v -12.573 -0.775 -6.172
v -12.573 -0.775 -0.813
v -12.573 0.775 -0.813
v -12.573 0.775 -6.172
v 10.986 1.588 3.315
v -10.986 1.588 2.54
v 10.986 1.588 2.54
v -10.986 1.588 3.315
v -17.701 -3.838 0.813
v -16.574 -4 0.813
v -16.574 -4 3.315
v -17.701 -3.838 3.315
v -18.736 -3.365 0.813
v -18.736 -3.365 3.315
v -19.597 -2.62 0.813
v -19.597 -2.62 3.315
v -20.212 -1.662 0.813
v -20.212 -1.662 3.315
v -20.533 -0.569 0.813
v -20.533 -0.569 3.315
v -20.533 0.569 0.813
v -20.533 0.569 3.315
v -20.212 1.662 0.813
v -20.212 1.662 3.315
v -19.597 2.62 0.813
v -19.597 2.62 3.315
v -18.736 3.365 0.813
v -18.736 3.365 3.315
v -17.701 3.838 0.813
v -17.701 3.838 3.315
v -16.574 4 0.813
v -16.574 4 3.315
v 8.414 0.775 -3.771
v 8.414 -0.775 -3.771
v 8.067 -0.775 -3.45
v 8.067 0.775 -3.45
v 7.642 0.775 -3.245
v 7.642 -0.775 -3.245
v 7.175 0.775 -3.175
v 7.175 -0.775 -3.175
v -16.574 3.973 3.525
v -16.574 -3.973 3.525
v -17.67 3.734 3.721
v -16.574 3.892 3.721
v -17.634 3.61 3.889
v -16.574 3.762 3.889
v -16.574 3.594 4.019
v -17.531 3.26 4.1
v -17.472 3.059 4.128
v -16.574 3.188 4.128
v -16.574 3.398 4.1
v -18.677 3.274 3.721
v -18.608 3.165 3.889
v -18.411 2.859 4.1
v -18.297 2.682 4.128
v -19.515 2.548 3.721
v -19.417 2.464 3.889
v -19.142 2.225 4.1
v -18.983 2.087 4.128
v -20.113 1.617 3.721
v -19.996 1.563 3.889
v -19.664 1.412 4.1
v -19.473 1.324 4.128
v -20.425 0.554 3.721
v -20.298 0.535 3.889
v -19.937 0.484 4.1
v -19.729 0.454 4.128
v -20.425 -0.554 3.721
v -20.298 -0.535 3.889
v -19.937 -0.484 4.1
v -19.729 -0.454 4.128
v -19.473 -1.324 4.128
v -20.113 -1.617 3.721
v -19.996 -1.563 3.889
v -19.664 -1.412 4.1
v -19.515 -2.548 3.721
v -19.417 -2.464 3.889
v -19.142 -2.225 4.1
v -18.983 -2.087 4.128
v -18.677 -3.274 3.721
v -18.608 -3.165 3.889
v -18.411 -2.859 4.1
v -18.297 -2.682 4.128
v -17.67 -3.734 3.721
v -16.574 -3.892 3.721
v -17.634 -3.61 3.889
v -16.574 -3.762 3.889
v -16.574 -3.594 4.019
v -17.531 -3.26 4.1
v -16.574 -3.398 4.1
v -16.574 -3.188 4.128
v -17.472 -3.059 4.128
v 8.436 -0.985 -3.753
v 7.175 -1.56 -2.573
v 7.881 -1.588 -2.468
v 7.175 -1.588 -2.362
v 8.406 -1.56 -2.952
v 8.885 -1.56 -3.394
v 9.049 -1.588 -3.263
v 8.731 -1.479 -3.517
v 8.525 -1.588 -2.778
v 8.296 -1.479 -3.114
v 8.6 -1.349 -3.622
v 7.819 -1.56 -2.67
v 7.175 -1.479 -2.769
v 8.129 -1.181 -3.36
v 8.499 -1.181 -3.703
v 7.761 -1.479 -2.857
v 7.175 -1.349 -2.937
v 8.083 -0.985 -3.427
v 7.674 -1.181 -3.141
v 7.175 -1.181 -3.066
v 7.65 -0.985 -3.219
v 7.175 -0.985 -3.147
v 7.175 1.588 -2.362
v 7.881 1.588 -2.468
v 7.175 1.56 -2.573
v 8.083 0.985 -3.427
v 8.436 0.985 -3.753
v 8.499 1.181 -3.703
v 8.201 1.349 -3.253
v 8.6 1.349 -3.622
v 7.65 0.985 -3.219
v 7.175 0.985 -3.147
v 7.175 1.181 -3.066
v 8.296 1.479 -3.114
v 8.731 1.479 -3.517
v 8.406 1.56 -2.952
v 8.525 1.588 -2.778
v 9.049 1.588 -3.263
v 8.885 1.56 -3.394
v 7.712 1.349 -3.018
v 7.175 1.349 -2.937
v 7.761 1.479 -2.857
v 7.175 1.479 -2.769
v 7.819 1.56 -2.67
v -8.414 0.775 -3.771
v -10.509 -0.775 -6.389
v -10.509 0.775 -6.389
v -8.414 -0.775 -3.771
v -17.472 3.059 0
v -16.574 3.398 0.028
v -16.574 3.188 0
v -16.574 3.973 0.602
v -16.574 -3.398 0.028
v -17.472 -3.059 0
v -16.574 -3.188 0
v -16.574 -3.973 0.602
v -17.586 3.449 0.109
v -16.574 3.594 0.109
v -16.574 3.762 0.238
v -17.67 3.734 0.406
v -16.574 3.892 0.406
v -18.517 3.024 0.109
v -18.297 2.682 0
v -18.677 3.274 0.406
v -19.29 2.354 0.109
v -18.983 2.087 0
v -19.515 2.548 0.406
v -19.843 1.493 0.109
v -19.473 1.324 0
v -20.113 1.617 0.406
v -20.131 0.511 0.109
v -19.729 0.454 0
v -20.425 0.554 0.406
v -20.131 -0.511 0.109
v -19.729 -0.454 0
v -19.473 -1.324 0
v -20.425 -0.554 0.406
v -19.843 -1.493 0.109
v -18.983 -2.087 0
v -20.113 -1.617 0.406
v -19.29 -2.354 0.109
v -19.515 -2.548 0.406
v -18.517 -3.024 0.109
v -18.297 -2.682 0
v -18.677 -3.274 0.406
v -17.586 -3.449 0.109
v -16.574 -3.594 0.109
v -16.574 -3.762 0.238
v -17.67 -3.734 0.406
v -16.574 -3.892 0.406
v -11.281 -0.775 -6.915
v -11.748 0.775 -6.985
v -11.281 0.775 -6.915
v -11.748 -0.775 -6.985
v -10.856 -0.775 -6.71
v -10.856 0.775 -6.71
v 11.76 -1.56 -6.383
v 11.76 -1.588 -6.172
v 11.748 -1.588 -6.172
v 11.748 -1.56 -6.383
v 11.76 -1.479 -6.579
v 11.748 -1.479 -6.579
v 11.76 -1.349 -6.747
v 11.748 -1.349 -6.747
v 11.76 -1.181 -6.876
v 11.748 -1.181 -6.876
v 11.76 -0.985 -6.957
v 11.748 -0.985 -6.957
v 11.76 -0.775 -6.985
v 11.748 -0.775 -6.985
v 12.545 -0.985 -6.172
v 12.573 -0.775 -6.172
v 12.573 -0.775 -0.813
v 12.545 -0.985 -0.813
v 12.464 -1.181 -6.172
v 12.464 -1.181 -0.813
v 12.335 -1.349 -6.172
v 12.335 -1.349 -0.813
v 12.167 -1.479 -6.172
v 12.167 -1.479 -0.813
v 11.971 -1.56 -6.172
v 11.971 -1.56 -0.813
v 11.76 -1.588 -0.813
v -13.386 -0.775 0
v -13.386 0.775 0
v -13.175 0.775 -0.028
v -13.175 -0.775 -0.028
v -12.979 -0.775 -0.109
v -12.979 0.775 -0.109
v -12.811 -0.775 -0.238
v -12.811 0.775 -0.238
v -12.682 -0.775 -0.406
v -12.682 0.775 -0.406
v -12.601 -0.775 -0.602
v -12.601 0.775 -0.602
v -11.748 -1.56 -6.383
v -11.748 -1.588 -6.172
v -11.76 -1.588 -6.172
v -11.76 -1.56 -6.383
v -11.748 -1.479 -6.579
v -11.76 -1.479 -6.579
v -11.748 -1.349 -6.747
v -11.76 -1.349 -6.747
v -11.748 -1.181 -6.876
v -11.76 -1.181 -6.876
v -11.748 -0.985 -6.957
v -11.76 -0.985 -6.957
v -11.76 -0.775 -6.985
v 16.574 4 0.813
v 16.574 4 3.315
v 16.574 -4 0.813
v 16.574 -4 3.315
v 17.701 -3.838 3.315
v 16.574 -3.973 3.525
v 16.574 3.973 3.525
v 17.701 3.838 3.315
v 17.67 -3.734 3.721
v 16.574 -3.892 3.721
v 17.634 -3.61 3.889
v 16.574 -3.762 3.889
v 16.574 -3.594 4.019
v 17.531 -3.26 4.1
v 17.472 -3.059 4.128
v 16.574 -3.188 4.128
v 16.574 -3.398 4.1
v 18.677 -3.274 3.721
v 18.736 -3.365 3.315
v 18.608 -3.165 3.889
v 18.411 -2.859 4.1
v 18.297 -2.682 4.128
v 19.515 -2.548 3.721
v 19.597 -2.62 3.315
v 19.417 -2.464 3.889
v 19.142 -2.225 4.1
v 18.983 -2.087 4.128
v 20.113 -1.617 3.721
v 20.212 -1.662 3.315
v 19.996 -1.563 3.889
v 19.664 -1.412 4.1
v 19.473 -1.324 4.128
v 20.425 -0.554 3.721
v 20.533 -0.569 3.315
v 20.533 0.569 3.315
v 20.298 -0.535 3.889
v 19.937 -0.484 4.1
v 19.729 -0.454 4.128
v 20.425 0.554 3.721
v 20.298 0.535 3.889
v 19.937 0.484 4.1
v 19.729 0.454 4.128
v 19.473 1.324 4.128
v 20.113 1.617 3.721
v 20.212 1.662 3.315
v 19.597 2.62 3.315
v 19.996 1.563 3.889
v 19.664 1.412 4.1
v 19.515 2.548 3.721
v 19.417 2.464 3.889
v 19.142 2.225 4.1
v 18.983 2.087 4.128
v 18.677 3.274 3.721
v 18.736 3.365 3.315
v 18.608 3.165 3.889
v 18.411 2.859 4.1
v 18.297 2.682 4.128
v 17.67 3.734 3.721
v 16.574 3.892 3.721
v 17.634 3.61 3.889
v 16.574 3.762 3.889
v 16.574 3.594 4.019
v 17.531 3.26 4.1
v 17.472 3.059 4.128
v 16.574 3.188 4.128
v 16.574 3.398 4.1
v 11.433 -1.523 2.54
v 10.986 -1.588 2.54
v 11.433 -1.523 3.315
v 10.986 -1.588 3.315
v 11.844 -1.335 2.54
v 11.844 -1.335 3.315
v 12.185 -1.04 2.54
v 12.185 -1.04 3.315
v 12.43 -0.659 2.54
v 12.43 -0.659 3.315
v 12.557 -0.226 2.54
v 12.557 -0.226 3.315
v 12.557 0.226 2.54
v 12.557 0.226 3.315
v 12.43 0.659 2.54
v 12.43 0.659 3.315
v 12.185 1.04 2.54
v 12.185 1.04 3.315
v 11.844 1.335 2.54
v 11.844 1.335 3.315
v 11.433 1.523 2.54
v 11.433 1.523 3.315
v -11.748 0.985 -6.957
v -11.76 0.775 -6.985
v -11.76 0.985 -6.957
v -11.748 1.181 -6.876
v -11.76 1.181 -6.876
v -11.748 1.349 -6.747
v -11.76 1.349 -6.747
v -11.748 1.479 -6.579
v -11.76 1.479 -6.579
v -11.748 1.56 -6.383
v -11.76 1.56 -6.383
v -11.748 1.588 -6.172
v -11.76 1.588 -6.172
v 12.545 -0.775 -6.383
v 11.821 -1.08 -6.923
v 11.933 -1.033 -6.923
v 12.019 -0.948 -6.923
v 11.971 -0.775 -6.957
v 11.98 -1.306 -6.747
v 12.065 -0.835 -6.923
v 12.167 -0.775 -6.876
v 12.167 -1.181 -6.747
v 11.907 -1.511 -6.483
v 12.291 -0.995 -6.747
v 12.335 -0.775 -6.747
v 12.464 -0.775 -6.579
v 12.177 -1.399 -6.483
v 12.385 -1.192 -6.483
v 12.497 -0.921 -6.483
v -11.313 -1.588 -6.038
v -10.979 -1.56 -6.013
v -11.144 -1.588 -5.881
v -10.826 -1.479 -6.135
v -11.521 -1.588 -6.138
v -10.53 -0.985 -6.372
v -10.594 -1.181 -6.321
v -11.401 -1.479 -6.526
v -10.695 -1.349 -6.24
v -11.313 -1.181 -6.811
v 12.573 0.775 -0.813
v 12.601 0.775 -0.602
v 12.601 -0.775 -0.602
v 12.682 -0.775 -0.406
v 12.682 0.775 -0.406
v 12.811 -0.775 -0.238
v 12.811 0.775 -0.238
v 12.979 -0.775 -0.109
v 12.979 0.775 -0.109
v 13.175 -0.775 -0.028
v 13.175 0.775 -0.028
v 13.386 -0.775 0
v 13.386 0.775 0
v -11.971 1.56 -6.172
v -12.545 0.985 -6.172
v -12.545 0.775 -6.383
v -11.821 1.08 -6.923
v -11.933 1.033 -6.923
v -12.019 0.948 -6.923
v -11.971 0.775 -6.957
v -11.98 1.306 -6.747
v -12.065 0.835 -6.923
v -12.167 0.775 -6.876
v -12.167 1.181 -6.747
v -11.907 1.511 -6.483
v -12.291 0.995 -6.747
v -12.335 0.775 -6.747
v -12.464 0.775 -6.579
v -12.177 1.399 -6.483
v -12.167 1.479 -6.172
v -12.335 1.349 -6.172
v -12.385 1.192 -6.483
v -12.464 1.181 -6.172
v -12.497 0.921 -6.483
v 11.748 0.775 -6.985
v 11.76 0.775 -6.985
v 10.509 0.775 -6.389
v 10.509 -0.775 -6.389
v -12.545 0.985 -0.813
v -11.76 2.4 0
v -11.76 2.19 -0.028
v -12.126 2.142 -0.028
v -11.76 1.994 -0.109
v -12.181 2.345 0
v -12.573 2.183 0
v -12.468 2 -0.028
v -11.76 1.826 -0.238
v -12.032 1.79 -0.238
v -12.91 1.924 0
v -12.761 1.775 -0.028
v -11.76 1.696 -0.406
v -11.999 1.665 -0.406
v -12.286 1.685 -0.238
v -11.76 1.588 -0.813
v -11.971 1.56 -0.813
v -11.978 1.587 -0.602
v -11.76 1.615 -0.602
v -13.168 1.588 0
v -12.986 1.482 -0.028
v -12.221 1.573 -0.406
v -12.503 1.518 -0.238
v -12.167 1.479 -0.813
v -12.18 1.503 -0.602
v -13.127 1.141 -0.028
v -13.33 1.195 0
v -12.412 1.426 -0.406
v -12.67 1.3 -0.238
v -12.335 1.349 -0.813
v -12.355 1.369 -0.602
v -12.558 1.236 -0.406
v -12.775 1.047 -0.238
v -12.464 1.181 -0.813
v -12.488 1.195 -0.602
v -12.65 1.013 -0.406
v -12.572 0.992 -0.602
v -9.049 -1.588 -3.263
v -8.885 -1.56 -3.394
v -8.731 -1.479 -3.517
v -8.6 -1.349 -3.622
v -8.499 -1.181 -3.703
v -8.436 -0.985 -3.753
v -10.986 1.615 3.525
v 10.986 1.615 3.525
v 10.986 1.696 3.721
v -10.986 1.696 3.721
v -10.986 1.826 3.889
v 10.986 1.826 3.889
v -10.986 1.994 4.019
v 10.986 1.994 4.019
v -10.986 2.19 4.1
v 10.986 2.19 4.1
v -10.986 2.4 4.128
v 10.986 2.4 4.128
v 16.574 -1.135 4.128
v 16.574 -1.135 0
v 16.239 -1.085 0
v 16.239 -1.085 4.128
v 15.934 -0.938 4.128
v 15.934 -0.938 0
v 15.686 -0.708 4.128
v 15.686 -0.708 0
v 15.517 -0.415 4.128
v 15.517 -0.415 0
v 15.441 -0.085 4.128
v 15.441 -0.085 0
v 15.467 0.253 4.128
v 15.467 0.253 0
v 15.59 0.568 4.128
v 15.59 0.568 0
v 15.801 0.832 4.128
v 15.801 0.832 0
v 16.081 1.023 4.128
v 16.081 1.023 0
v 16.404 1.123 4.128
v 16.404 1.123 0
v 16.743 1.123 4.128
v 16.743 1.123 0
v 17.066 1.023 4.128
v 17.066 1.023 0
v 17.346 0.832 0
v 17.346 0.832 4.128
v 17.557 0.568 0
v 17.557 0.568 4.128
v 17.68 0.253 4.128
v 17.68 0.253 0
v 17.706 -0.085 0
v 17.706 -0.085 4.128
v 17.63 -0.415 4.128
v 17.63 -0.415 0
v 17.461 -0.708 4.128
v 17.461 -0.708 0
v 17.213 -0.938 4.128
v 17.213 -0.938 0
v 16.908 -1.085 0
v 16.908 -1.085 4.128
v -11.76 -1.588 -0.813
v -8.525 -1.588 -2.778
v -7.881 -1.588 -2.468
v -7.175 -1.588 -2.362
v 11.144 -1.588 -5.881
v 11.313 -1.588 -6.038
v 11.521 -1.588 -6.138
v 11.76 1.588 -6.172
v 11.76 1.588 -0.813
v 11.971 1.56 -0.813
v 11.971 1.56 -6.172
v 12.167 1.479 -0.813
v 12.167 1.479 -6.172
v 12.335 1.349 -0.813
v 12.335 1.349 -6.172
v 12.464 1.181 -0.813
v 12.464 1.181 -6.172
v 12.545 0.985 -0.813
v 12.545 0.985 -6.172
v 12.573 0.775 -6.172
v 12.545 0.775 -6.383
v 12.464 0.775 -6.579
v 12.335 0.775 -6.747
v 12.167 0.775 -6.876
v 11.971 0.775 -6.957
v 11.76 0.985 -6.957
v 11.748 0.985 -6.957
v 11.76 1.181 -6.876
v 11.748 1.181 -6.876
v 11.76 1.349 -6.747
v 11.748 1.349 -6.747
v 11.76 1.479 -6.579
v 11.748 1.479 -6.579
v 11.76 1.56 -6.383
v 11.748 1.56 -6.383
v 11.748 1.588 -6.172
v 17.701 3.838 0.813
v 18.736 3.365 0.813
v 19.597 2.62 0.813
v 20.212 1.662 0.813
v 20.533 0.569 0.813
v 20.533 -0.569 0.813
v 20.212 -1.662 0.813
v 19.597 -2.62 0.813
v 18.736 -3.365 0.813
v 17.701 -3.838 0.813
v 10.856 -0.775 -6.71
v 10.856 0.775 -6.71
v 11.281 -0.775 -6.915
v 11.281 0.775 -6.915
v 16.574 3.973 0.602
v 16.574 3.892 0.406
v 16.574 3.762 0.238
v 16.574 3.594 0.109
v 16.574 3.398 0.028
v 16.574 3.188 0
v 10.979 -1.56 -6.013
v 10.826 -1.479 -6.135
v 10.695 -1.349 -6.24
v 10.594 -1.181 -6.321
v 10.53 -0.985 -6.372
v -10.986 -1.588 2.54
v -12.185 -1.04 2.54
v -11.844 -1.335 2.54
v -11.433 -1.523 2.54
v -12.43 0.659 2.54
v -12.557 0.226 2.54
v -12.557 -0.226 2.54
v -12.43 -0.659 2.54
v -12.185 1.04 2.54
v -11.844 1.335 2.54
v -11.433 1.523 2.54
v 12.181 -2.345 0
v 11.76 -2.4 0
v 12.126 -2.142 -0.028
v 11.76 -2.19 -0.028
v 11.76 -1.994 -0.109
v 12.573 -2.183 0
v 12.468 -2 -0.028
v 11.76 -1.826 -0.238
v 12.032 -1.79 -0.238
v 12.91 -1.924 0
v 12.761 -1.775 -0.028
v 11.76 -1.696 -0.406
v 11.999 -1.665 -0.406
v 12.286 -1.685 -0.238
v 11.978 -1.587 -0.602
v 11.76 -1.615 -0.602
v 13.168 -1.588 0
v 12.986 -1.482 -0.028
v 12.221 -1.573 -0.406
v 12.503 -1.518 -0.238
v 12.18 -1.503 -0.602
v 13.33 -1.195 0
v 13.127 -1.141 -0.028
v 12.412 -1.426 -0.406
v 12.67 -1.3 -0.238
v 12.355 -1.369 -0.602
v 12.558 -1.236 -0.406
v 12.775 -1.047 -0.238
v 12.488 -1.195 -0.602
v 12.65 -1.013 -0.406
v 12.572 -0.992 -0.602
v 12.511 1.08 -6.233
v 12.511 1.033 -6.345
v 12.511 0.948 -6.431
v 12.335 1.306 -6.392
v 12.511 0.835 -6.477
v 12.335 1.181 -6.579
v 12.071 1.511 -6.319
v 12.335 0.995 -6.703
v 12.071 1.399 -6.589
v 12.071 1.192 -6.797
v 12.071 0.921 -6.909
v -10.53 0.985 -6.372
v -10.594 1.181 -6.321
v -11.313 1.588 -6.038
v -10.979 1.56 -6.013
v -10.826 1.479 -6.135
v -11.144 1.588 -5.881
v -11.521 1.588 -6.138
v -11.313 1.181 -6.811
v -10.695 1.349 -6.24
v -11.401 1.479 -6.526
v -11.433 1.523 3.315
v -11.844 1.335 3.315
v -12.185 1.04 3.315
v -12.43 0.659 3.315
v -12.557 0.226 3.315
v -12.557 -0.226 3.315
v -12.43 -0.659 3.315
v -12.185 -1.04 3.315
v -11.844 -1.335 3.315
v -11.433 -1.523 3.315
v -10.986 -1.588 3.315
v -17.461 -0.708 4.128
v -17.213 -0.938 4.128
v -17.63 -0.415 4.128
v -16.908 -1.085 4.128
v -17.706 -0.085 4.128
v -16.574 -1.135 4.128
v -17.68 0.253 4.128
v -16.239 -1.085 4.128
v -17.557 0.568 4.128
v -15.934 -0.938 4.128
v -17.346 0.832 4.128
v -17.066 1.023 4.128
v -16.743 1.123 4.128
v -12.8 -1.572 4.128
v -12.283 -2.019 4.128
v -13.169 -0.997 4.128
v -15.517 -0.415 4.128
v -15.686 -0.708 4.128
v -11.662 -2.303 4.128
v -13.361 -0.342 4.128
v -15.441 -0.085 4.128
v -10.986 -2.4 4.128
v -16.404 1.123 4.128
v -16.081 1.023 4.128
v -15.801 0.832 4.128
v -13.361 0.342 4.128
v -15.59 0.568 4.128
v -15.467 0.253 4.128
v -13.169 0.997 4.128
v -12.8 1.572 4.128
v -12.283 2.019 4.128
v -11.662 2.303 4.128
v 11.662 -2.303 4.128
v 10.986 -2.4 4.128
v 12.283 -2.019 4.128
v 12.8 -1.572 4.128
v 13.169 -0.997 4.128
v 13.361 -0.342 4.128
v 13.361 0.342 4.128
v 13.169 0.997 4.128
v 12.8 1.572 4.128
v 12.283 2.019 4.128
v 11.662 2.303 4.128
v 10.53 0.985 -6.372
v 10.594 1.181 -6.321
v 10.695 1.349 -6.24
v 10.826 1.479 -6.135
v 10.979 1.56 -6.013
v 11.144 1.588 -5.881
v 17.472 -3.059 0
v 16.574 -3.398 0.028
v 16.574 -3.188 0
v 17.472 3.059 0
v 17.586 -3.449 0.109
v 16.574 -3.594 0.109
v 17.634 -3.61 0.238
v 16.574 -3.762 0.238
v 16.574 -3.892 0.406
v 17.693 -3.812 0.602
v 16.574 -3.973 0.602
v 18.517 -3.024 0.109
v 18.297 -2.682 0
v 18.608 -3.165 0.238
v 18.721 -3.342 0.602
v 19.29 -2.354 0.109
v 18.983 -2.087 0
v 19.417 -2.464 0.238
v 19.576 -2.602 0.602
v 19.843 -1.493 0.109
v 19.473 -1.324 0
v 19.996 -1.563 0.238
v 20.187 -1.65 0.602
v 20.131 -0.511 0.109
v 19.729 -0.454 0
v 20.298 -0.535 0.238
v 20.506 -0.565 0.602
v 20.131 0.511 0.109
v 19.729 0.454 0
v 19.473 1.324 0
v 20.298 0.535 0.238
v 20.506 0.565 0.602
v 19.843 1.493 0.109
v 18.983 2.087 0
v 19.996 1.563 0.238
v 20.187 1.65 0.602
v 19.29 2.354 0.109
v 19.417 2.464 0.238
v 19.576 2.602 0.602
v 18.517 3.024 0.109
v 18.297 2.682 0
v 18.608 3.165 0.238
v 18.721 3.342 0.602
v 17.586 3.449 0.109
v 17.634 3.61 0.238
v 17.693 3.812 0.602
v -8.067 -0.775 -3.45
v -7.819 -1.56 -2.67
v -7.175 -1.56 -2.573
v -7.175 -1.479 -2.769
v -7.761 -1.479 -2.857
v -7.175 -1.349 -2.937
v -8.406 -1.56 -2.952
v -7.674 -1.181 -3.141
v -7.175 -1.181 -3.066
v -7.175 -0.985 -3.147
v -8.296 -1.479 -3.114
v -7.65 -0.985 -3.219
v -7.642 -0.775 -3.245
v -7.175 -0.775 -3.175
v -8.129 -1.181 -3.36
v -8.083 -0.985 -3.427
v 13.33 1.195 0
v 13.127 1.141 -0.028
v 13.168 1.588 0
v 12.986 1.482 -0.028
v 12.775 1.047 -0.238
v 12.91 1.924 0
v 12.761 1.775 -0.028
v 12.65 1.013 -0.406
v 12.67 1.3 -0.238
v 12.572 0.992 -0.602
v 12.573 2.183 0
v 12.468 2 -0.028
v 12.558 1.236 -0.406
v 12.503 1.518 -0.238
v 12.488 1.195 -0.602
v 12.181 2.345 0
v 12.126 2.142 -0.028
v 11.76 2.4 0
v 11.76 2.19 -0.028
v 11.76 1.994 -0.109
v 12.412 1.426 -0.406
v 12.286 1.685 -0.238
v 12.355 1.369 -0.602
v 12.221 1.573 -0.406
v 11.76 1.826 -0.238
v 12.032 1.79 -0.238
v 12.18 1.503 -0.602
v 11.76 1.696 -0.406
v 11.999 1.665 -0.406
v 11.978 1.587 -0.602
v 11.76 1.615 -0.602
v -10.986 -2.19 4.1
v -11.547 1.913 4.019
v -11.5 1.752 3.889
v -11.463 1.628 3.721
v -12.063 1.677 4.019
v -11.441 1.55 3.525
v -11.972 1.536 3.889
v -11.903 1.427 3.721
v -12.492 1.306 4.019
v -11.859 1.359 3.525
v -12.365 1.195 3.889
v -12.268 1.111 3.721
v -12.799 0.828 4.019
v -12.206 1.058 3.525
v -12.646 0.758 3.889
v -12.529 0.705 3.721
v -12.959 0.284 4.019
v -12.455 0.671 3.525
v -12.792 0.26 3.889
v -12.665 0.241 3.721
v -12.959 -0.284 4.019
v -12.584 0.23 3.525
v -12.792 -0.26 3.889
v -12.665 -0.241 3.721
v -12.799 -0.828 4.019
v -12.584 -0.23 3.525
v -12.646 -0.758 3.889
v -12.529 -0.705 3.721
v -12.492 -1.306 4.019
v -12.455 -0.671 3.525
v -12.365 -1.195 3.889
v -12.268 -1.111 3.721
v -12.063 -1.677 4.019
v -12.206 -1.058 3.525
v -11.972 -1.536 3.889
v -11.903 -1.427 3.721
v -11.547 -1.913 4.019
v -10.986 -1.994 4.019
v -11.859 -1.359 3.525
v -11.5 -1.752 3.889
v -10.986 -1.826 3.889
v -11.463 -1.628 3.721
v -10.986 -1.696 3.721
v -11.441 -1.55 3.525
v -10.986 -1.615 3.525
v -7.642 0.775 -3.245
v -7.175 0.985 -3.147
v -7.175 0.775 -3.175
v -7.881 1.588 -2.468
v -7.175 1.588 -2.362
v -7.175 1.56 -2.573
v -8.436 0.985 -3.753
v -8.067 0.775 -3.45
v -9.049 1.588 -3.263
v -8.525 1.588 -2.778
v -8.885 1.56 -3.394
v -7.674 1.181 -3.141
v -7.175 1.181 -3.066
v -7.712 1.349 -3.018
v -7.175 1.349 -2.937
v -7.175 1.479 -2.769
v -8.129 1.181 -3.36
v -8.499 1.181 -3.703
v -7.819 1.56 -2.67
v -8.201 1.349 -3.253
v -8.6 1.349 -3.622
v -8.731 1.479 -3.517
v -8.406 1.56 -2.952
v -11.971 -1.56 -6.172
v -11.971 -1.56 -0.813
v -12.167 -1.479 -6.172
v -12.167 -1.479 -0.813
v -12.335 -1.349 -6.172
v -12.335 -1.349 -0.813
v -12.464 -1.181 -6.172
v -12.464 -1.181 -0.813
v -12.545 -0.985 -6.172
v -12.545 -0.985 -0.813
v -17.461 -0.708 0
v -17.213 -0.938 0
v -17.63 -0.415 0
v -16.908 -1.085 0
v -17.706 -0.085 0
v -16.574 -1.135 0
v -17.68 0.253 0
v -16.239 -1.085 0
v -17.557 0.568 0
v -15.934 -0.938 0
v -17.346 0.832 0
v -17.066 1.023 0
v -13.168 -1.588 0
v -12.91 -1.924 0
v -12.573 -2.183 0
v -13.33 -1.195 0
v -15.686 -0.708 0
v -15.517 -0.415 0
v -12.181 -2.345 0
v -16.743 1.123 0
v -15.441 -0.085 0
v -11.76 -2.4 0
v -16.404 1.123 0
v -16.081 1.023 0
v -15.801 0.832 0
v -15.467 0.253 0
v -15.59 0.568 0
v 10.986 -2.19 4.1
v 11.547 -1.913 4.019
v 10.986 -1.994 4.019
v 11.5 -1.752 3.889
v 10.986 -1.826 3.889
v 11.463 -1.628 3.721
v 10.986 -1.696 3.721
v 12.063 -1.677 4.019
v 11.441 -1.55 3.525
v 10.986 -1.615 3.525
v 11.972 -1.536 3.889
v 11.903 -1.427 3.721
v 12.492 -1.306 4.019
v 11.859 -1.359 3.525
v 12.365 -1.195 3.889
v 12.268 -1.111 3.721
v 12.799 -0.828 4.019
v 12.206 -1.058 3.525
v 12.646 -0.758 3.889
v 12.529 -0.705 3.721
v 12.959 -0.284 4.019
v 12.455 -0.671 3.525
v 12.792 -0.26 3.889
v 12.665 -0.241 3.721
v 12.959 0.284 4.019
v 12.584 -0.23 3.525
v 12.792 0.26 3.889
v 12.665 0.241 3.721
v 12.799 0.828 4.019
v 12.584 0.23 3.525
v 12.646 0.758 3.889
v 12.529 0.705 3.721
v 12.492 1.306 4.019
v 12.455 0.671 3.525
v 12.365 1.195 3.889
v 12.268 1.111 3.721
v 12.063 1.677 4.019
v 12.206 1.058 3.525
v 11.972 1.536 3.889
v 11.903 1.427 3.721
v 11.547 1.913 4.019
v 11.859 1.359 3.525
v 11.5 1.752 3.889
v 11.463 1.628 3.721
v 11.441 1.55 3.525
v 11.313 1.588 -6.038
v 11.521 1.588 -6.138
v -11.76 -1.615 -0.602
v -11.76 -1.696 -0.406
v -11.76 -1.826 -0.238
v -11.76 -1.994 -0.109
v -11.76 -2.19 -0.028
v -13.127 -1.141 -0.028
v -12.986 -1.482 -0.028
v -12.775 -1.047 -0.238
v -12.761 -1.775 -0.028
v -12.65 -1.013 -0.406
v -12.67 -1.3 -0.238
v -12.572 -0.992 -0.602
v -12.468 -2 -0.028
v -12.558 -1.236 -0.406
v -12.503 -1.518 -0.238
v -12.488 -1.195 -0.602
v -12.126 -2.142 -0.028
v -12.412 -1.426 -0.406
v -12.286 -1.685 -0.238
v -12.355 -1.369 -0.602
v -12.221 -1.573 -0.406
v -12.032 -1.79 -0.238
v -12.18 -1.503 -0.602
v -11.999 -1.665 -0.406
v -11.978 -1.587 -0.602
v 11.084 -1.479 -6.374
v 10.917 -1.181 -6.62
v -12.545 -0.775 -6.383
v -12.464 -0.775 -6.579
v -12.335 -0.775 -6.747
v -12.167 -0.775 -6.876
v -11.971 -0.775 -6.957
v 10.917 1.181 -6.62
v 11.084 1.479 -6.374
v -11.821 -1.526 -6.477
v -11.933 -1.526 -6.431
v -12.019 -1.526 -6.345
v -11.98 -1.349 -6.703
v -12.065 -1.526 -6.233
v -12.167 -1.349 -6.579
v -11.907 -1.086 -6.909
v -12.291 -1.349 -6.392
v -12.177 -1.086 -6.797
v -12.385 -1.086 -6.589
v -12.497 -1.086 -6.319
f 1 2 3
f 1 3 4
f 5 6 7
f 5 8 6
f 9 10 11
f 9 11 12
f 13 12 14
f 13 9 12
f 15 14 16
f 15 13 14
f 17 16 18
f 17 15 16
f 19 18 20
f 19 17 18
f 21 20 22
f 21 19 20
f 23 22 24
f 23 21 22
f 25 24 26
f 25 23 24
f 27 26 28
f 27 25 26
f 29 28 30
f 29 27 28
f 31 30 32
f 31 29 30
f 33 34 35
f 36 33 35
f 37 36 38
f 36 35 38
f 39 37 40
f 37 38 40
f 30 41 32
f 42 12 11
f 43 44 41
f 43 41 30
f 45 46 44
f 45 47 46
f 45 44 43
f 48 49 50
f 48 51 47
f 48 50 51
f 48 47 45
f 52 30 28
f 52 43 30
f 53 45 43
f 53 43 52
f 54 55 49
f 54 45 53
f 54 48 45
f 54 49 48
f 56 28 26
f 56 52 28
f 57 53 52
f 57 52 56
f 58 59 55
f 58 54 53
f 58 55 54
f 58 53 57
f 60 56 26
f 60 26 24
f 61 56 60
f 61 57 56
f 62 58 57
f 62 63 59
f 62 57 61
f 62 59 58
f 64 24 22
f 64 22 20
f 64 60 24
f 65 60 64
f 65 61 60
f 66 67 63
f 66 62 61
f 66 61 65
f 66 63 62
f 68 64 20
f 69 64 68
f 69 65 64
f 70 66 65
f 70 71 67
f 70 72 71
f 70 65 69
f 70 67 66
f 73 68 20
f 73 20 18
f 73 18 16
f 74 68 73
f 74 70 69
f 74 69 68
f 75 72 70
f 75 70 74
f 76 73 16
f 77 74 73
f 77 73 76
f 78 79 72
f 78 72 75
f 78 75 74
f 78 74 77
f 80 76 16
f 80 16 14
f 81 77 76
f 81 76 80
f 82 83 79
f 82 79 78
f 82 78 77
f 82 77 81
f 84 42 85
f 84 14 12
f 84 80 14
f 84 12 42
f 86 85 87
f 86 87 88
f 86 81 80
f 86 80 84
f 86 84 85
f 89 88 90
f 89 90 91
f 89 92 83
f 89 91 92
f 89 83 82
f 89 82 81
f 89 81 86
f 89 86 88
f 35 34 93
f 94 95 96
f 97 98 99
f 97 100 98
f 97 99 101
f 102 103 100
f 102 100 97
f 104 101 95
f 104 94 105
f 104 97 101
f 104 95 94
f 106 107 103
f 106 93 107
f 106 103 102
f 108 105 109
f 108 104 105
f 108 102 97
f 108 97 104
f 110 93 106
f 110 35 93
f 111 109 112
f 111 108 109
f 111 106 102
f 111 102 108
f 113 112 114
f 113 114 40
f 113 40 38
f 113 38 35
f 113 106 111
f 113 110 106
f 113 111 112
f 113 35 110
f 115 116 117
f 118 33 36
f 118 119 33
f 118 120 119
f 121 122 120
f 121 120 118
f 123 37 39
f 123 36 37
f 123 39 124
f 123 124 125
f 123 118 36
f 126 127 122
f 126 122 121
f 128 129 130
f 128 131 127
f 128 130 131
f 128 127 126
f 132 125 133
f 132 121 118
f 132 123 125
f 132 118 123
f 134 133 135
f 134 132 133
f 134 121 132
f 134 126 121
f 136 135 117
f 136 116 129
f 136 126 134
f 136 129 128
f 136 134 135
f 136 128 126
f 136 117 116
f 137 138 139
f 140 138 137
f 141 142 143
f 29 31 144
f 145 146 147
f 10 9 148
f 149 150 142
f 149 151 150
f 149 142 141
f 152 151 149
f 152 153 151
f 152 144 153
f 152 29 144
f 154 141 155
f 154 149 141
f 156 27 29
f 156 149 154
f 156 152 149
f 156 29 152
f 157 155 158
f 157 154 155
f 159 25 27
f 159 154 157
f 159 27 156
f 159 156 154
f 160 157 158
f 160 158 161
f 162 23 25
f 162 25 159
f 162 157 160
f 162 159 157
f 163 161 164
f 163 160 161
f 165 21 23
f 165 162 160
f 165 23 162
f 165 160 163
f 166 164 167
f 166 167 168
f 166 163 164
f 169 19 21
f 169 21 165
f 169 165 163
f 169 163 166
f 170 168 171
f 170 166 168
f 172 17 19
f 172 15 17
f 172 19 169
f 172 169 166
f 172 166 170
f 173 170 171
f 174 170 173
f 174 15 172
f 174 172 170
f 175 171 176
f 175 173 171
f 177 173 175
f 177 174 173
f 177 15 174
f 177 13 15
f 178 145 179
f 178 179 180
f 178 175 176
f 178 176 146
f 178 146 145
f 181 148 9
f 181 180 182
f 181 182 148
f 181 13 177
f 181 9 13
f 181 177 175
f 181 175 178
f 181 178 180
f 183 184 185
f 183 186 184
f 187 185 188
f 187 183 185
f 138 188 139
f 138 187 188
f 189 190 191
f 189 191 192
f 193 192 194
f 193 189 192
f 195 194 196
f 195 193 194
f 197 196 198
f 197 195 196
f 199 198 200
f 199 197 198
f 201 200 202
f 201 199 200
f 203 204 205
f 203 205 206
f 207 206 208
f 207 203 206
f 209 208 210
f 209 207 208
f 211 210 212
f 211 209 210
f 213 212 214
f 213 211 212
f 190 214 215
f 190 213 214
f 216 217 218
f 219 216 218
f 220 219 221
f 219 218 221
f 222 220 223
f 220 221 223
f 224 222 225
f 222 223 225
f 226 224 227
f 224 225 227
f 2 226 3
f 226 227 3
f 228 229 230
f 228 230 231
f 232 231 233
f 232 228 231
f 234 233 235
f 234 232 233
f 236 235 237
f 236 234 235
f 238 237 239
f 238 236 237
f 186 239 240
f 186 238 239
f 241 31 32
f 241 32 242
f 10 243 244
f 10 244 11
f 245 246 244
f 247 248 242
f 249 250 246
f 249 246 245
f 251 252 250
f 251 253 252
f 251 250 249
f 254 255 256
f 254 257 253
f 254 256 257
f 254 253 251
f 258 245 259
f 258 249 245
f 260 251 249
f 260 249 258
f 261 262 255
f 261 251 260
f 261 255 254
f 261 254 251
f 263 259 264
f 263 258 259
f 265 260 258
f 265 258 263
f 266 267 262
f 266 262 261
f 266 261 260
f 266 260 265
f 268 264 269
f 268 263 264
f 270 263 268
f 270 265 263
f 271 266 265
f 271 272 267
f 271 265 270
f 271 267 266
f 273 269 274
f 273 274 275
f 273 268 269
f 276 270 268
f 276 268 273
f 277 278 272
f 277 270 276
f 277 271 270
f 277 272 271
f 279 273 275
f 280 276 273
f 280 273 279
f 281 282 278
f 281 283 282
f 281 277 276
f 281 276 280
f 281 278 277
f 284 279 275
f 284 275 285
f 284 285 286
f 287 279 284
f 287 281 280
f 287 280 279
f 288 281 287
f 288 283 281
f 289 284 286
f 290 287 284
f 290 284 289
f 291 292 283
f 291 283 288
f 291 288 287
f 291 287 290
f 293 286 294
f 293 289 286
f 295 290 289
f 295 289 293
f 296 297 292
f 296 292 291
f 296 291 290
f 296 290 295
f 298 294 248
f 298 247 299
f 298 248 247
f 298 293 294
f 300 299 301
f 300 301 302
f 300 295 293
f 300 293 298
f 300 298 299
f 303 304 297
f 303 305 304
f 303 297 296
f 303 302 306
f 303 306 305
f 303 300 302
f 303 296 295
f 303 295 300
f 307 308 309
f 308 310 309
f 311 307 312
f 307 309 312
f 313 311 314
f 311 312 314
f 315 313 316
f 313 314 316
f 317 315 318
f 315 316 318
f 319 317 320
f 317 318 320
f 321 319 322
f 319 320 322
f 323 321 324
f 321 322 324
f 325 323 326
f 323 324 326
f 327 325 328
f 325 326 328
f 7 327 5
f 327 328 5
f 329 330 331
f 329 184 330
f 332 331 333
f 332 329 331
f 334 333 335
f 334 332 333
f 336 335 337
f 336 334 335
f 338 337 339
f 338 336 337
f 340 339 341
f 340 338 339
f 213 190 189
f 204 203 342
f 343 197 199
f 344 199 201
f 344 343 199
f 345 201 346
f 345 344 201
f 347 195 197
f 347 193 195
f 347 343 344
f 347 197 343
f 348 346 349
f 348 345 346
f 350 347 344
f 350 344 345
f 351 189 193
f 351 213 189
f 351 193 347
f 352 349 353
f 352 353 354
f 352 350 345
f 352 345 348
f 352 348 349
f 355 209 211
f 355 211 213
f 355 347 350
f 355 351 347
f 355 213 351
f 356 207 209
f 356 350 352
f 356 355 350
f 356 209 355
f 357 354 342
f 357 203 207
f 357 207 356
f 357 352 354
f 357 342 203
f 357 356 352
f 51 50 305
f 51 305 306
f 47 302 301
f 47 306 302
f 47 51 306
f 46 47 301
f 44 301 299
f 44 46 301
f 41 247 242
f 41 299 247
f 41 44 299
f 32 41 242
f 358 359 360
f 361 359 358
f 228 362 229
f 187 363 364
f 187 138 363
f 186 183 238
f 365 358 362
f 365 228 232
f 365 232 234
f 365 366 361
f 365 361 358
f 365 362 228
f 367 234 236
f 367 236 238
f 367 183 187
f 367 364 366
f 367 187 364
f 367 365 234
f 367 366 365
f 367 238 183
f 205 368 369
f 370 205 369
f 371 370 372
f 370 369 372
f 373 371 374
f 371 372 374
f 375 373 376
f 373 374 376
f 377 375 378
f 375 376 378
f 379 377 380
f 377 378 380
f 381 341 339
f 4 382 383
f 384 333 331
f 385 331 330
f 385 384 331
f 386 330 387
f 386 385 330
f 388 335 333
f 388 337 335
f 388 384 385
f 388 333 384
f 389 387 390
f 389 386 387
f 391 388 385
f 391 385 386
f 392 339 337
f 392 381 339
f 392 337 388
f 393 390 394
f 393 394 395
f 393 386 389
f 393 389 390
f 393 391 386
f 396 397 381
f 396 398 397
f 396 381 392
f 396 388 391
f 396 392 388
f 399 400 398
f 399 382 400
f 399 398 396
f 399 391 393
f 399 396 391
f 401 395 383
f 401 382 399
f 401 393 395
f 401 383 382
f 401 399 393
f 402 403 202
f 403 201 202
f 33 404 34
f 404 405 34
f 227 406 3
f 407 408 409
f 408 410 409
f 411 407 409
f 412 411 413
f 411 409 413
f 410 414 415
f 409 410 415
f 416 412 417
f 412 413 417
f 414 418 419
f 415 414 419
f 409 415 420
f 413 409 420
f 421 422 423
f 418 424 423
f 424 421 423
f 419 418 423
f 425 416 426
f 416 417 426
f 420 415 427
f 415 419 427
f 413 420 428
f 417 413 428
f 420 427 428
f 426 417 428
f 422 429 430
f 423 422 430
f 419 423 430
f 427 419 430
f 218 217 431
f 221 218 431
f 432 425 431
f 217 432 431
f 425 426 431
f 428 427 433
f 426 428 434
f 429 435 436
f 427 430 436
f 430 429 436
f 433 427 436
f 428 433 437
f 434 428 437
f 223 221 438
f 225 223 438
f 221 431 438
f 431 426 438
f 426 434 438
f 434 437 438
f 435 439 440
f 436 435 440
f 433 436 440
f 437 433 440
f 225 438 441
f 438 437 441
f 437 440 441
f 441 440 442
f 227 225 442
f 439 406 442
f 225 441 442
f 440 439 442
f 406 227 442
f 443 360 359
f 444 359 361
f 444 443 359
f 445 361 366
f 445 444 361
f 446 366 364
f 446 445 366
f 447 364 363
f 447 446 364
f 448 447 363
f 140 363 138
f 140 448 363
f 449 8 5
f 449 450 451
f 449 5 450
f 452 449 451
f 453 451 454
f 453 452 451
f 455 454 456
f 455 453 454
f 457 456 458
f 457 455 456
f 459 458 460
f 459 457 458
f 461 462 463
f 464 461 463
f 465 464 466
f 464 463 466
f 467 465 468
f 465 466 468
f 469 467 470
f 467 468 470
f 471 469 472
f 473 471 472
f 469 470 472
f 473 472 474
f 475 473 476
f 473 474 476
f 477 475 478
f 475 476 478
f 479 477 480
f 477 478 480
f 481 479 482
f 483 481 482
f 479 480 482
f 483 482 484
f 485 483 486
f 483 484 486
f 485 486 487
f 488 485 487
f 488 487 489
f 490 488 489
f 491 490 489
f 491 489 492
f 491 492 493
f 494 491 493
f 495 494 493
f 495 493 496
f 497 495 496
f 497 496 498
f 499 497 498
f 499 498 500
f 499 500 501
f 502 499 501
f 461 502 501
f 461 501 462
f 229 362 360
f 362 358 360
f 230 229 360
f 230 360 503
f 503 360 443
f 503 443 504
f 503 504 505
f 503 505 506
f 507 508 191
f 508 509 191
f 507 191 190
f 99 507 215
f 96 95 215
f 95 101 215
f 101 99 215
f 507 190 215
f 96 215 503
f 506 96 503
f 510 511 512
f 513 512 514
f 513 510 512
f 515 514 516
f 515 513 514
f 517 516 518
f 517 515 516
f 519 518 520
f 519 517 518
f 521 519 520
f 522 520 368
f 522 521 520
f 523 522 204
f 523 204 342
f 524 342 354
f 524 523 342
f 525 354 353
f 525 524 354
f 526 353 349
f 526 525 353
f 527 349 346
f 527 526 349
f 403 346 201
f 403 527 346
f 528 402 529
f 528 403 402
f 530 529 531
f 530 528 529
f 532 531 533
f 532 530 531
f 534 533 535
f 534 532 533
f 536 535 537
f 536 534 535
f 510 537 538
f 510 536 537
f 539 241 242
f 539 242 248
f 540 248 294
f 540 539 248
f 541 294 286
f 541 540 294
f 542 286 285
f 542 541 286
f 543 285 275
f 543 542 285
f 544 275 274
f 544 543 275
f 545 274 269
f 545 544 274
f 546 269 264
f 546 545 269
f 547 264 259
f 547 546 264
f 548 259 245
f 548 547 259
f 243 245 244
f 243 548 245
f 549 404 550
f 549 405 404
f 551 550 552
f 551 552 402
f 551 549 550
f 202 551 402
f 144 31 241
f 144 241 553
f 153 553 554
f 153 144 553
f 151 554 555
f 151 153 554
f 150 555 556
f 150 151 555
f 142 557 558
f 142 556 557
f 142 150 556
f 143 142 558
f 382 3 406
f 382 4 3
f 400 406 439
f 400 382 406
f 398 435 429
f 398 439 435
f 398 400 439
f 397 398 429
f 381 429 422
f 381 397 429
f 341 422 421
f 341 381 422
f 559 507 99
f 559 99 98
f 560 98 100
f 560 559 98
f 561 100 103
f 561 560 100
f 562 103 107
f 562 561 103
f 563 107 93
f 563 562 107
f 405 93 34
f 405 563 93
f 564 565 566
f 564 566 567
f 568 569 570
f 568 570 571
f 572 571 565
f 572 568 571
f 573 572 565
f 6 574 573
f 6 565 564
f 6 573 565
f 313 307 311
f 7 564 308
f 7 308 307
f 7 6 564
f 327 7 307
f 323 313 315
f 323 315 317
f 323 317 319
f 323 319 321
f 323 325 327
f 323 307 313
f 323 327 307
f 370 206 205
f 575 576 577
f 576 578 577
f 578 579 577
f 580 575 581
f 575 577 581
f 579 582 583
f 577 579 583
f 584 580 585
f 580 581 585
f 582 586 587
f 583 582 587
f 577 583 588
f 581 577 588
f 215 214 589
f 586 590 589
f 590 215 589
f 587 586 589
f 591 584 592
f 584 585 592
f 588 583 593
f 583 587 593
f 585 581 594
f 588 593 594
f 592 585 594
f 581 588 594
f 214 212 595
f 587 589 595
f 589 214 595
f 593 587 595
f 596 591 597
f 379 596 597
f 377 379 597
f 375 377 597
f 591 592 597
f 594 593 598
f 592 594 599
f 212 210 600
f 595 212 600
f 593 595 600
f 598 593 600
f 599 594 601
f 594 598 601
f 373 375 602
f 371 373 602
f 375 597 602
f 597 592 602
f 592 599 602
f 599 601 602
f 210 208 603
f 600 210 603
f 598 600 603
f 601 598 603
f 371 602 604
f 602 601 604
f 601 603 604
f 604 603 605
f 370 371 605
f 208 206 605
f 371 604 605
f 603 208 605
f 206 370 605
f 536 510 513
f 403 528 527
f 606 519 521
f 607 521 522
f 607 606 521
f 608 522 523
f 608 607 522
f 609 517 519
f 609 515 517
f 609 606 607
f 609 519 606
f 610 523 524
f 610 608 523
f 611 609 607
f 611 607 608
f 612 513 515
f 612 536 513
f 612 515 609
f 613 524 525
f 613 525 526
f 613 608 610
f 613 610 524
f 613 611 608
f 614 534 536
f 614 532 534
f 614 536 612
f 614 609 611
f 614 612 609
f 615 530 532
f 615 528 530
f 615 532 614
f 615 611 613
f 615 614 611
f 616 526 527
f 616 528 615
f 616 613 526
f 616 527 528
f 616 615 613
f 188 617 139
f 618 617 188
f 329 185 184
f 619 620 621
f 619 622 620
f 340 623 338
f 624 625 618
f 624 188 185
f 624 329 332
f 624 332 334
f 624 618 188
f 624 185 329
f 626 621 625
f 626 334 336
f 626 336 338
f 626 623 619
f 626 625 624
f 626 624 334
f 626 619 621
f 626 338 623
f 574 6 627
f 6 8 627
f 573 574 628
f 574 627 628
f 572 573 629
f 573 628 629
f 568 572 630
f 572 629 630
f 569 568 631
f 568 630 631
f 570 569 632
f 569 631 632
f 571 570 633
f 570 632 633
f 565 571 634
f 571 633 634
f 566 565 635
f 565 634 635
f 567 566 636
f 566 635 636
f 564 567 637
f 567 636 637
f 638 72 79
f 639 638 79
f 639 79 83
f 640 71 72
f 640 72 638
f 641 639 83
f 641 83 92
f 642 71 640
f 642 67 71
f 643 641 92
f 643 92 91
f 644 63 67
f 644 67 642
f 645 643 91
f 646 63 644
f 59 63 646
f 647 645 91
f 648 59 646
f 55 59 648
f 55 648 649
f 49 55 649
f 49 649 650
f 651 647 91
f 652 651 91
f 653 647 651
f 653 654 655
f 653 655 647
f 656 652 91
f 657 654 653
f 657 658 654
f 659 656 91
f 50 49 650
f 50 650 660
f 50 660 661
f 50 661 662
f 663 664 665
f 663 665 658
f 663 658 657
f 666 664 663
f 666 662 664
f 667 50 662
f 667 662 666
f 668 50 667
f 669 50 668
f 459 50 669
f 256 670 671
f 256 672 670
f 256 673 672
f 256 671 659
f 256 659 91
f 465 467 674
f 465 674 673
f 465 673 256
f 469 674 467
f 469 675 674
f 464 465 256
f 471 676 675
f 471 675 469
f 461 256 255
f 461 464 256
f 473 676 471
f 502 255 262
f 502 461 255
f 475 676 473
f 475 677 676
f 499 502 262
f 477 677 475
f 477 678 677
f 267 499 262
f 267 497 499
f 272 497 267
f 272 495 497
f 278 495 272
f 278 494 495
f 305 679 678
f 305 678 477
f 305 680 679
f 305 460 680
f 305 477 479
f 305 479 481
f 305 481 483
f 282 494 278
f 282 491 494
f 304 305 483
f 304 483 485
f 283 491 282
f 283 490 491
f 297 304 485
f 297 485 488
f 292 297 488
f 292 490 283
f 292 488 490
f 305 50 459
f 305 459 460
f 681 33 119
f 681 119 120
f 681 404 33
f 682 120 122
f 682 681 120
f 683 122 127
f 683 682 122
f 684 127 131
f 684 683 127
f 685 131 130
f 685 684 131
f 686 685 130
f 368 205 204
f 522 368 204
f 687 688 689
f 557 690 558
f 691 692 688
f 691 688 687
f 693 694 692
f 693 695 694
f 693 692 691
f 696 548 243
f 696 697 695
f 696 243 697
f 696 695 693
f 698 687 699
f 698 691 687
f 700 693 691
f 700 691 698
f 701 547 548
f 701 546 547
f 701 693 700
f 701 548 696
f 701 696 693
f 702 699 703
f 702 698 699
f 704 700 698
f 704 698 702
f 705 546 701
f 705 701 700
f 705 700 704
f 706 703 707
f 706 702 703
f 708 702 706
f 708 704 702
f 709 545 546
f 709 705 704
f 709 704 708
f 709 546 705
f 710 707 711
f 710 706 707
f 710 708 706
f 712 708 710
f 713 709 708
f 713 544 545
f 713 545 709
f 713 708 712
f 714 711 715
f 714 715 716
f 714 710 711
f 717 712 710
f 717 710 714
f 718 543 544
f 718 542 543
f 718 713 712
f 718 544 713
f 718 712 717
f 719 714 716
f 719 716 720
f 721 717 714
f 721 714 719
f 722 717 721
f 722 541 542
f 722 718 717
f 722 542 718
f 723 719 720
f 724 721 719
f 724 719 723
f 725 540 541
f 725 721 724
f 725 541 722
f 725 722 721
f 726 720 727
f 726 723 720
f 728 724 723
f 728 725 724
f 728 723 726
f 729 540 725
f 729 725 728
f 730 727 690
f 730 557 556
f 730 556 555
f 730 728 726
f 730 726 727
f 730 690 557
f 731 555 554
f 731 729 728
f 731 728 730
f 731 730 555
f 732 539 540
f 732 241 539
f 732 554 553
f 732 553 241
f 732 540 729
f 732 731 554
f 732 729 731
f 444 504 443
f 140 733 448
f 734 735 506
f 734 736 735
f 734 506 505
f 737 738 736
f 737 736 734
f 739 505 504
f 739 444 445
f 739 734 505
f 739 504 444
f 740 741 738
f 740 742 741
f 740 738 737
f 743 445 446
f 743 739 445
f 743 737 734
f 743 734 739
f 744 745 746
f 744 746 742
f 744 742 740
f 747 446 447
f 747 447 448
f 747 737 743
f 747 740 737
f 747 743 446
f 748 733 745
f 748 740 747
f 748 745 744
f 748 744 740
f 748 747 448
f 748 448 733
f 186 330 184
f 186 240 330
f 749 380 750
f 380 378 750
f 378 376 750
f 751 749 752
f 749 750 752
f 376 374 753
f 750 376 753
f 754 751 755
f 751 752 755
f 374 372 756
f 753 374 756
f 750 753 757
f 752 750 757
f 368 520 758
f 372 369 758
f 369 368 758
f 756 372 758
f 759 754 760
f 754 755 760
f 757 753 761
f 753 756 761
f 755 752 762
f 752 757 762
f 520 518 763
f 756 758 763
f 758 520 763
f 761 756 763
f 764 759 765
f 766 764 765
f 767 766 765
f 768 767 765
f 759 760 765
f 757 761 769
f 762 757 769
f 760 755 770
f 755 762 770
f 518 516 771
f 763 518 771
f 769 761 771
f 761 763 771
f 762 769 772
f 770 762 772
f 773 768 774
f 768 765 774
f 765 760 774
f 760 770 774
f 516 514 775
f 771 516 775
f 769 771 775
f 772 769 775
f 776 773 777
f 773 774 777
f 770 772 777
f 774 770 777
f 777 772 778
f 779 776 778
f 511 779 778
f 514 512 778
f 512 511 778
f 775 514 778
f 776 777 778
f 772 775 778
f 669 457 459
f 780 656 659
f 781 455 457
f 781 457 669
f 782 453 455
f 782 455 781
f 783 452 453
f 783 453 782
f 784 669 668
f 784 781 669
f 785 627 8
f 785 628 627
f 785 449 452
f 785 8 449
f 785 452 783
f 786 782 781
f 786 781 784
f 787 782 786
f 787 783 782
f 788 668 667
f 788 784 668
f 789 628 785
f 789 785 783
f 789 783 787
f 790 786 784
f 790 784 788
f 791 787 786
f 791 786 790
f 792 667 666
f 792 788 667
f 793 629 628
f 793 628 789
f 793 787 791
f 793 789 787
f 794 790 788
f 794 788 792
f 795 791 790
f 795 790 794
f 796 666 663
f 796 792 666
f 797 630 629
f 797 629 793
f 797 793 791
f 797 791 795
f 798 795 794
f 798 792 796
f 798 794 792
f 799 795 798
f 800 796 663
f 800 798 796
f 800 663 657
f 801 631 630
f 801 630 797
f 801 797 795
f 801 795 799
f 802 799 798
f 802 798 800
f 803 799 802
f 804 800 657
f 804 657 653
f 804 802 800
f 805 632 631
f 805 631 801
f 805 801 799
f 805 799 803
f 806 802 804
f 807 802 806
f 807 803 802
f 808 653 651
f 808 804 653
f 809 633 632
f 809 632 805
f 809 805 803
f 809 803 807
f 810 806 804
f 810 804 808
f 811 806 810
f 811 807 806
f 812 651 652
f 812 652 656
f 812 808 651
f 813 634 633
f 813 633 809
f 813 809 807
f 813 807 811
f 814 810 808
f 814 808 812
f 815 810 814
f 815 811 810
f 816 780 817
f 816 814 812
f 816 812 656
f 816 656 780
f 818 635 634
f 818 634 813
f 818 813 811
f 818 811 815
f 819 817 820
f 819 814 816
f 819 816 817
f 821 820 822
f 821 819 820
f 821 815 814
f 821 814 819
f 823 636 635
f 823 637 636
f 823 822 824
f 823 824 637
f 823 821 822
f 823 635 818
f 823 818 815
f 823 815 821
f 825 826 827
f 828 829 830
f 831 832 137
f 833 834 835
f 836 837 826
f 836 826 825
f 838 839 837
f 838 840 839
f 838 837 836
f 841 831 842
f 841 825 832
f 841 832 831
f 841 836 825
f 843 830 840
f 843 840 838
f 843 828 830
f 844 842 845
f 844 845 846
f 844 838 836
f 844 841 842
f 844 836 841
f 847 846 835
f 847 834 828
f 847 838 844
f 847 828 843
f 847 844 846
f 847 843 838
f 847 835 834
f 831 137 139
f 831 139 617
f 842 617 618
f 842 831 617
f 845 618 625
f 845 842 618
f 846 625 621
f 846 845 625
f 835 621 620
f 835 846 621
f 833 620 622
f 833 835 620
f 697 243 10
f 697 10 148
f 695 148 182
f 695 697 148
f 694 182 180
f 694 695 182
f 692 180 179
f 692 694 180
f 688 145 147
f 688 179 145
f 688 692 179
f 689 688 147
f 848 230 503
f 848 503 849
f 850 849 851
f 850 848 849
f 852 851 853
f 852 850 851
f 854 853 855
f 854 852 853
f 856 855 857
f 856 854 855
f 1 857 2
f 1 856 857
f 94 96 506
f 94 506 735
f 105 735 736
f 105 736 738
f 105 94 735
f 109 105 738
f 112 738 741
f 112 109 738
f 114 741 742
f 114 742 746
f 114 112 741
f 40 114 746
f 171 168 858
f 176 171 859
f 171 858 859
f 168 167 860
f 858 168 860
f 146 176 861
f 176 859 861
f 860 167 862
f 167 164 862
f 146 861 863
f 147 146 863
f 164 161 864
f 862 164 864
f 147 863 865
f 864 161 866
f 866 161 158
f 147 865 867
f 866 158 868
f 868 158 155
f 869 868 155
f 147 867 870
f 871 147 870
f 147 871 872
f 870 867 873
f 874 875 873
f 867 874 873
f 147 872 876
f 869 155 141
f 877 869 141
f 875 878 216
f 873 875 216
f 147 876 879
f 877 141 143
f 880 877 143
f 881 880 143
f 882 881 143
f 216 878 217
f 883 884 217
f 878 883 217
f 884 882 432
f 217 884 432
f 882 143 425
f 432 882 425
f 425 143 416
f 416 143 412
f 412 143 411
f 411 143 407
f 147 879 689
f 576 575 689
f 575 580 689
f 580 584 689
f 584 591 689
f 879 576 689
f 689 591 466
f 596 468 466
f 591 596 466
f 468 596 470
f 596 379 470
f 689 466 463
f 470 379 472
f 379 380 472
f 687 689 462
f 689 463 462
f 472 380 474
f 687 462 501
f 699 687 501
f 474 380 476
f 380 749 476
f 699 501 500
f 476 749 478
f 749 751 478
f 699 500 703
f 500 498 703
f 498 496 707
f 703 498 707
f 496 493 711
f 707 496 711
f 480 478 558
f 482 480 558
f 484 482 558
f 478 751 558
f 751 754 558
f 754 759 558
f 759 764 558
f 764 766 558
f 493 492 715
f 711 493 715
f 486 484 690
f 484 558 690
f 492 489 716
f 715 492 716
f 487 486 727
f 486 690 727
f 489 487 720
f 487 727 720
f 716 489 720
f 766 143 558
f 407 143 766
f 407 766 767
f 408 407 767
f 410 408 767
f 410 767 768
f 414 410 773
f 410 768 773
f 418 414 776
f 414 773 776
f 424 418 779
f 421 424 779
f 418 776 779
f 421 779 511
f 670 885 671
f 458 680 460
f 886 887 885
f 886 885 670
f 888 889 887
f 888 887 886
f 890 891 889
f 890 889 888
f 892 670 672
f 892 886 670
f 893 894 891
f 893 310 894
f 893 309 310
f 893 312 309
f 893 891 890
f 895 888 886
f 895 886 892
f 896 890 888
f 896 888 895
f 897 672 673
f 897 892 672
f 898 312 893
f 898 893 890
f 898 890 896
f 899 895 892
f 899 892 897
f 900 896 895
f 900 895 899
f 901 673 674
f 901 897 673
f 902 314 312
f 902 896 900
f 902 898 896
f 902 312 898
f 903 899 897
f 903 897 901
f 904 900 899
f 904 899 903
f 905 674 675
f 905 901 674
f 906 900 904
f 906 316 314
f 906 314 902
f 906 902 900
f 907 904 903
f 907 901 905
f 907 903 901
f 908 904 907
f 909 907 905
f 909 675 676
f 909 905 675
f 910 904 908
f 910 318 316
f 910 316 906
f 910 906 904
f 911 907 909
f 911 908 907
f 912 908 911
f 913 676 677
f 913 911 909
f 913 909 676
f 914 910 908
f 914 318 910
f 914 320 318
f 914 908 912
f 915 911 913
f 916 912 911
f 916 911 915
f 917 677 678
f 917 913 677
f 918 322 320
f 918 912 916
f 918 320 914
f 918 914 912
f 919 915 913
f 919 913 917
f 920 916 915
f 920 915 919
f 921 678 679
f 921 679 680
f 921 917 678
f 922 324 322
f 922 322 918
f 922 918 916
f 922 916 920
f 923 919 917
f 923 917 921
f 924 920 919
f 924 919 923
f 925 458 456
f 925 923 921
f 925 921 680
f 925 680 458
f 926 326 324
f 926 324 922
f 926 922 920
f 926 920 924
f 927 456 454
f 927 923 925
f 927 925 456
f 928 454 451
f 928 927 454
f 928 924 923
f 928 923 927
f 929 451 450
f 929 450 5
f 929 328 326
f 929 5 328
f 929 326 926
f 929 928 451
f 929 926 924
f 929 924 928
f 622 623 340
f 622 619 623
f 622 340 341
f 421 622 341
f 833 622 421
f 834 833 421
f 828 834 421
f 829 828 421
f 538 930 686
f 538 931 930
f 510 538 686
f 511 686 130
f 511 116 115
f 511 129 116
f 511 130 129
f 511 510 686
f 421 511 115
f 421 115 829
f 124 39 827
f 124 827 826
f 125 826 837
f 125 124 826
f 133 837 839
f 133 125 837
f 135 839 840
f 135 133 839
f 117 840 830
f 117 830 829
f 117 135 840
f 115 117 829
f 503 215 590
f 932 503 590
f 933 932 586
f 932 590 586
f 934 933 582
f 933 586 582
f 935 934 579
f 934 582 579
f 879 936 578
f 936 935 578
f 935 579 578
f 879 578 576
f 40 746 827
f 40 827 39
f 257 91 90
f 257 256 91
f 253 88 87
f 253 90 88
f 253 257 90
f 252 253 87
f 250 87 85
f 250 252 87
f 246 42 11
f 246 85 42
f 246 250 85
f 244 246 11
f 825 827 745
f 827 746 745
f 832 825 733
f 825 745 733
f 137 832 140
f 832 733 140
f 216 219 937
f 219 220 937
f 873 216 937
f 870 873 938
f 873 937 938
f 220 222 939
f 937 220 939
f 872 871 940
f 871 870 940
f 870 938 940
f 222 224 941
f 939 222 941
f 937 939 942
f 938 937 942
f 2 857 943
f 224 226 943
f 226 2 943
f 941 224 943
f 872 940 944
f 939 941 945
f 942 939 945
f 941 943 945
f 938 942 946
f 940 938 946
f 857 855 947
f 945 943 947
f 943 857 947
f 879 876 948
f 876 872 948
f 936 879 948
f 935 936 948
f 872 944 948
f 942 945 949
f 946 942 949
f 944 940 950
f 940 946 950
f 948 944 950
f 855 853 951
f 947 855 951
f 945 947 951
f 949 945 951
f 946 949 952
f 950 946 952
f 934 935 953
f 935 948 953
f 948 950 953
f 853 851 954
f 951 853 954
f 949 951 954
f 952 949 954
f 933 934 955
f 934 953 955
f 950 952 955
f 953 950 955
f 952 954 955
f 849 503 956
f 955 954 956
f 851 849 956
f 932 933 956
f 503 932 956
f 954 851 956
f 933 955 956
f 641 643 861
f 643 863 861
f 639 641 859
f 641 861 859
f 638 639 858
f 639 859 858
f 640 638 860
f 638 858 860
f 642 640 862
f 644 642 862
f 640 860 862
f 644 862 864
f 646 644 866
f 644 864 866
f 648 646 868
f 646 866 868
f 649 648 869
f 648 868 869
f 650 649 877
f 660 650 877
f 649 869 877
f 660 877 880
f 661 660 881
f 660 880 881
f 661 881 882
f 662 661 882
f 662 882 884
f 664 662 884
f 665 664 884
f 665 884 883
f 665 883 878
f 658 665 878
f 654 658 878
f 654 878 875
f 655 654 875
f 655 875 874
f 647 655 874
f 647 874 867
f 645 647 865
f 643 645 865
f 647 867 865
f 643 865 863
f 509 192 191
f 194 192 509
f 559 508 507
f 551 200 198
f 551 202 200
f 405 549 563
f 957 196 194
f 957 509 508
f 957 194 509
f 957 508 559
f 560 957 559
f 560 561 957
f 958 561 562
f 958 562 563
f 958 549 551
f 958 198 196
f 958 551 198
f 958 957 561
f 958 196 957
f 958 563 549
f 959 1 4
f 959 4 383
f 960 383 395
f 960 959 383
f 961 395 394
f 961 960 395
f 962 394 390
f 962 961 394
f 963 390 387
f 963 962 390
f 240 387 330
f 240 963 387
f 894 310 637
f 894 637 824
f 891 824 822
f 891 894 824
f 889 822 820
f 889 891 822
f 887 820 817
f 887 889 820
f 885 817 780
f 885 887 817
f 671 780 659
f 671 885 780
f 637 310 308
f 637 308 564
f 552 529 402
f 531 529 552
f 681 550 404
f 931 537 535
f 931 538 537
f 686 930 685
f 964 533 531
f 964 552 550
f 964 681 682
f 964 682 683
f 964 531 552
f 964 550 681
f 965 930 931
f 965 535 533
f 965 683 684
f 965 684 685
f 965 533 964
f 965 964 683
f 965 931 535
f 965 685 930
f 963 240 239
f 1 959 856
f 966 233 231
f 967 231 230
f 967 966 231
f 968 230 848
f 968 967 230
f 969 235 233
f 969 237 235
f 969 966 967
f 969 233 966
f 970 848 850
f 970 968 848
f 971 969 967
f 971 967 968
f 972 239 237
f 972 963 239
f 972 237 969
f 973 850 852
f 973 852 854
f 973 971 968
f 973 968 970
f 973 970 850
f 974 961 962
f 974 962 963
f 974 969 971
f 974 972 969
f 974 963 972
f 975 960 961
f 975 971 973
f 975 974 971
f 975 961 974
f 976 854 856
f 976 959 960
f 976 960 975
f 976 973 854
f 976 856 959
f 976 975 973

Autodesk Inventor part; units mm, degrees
ref_plane "YZ Plane" through (0, 0, 0) normal (1, 0, 0) x (0, 1, 0)
ref_plane "XZ Plane" through (0, 0, 0) normal (0, 1, 0) x (-1, 0, 0)
sketch "Sketch1" plane through (0, 0, 0) normal (0, 0, 1) x (1, 0, 0)
  line L0 (-16.5735, 4.0005) -> (16.5735, 4.0005)
  line L1 (16.5735, 4.0005) -> (16.5735, -4.0005) construction
  line L2 (16.5735, -4.0005) -> (-16.5735, -4.0005)
  line L3 (-16.5735, -4.0005) -> (-16.5735, 4.0005) construction
  line L4 (-16.5735, 4.0005) -> (16.5735, -4.0005) construction
  line L5 (16.5735, 4.0005) -> (-16.5735, -4.0005) construction
  arc A0 (16.5735, -4.0005) -> (16.5735, 4.0005) centre (16.5735, 0) ccw
  arc A1 (-16.5735, 4.0005) -> (-16.5735, -4.0005) centre (-16.5735, 0) ccw
  point P0 (0, 0)
  dimension "d0" = 33.147
  dimension "d1" = 8.001
  dimension "d2" = 4.0005
extrude "Extrusion1" add sketch "Sketch1" along normal blind 4.1275
sketch "Sketch2" plane through (0, 0, 4.1275) normal (0, 0, 1) x (1, 0, 0)
  line L0 (-10.9855, 1.5875) -> (10.9855, 1.5875)
  line L1 (10.9855, 1.5875) -> (10.9855, -1.5875) construction
  line L2 (10.9855, -1.5875) -> (-10.9855, -1.5875)
  line L3 (-10.9855, -1.5875) -> (-10.9855, 1.5875) construction
  line L4 (-10.9855, 1.5875) -> (10.9855, -1.5875) construction
  line L5 (10.9855, 1.5875) -> (-10.9855, -1.5875) construction
  arc A0 (-10.9855, 1.5875) -> (-10.9855, -1.5875) centre (-10.9855, 0) ccw
  arc A1 (10.9855, -1.5875) -> (10.9855, 1.5875) centre (10.9855, 0) ccw
  point P0 (0, 0)
  dimension "d5" = 21.971
  dimension "d6" = 3.175
extrude "Extrusion2" cut sketch "Sketch2" against normal blind 1.5875
sketch "Sketch3" plane through (0, 0, 4.1275) normal (0, 0, 1) x (1, 0, 0)
  arc A0 (16.5735, -4.0005) -> (16.5735, 4.0005) centre (16.5735, 0) ccw projected
  arc A1 (-16.5735, 4.0005) -> (-16.5735, -4.0005) centre (-16.5735, 0) ccw projected
  point P0 (0, 0)
hole "Hole1" at (16.5735, 0, 4.1275) at (-16.5735, 0, 4.1275) direction (0, 0, -1) diameter 2.2708 end through all thread size "4-48 UNF" class "2B" standard "ANSI Unified Screw Threads"
ref_plane "Work Plane1" through (-16.5735, 0, -37.9939) normal (0, 1, 0) x (0, 0, 1)
sketch "Sketch5" plane through (-16.5735, 0, -37.9939) normal (0, 1, 0) x (0, 0, 1)
  line L0 (37.9939, 0) -> (37.9939, 33.147) projected
  line L1 (37.9939, 4.0005) -> (31.0089, 4.0005)
  line L2 (37.9939, 4.0005) -> (44.9789, 4.0005) construction
  line L3 (31.0089, 4.0005) -> (31.0089, 5.588)
  line L4 (31.0089, 5.588) -> (34.8189, 8.636)
  line L5 (34.8189, 8.636) -> (34.8189, 24.511)
  line L6 (37.9939, -4.0005) -> (42.1214, -4.0005) projected
  line L7 (28.2149, 16.5735) -> (47.7729, 16.5735) construction
  line L8 (37.9939, 29.1465) -> (31.0089, 29.1465)
  line L9 (31.0089, 29.1465) -> (31.0089, 27.559)
  line L10 (31.0089, 27.559) -> (34.8189, 24.511)
  line L11 (34.8189, 8.636) -> (34.8189, 24.511)
  point P0 (37.9939, 16.5735)
  point P1 (34.8189, 16.5735)
  point P2 (37.9939, 16.5735)
  dimension "d16" = 6.985
  dimension "d17" = 180
  dimension "d18" = 1.5875
  dimension "d19" = 15.875
  dimension "d20" = 3.175
  dimension "d21" = 8.001
extrude "Extrusion3" add sketch "Sketch5" along normal mid plane 3.175
fillet "Fillet1" radius 1.5875 4 edges at (-7.9375, 0, -3.175) (-10.9855, 0, -6.985) (7.9375, 0, -3.175) (10.9855, 0, -6.985)
fillet "Fillet2" radius 0.8128 40 edges at (-12.573, 1.5875, -3.4925) (-11.0608, 1.5875, -6.8283) (-12.1607, 1.5875, -6.985) (-7.8622, 1.5875, -3.3317) (0, 1.5875, -3.175) (7.8622, 1.5875, -3.3317) (9.4615, 1.5875, -5.08) (11.0608, 1.5875, -6.8283) (12.1607, 1.5875, -6.985) (-9.4615, 1.5875, -5.08) (0, 1.5875, 0) (12.573, 1.5875, -3.4925) (12.573, 0, 0) (12.573, -1.5875, -3.4925) (12.573, 0, -6.985) (-12.573, 0, -6.985) (-12.573, 0, 0) (-12.573, -1.5875, -3.4925) (0, -1.5875, 0) (7.8622, -1.5875, -3.3317) (9.4615, -1.5875, -5.08) (11.0608, -1.5875, -6.8283) (12.1607, -1.5875, -6.985) (-7.8622, -1.5875, -3.3317) (-9.4615, -1.5875, -5.08) (-11.0608, -1.5875, -6.8283) (-12.1607, -1.5875, -6.985) (0, -1.5875, -3.175) (-20.574, 0, 0) (0, -4.0005, 0) (20.574, 0, 0) (0, 4.0005, 0) (-20.574, 0, 4.1275) (0, -4.0005, 4.1275) (20.574, 0, 4.1275) (0, 4.0005, 4.1275) (12.573, 0, 4.1275) (0, -1.5875, 4.1275) (-12.573, 0, 4.1275) (0, 1.5875, 4.1275)
properties part number "Front Shock Brace"
